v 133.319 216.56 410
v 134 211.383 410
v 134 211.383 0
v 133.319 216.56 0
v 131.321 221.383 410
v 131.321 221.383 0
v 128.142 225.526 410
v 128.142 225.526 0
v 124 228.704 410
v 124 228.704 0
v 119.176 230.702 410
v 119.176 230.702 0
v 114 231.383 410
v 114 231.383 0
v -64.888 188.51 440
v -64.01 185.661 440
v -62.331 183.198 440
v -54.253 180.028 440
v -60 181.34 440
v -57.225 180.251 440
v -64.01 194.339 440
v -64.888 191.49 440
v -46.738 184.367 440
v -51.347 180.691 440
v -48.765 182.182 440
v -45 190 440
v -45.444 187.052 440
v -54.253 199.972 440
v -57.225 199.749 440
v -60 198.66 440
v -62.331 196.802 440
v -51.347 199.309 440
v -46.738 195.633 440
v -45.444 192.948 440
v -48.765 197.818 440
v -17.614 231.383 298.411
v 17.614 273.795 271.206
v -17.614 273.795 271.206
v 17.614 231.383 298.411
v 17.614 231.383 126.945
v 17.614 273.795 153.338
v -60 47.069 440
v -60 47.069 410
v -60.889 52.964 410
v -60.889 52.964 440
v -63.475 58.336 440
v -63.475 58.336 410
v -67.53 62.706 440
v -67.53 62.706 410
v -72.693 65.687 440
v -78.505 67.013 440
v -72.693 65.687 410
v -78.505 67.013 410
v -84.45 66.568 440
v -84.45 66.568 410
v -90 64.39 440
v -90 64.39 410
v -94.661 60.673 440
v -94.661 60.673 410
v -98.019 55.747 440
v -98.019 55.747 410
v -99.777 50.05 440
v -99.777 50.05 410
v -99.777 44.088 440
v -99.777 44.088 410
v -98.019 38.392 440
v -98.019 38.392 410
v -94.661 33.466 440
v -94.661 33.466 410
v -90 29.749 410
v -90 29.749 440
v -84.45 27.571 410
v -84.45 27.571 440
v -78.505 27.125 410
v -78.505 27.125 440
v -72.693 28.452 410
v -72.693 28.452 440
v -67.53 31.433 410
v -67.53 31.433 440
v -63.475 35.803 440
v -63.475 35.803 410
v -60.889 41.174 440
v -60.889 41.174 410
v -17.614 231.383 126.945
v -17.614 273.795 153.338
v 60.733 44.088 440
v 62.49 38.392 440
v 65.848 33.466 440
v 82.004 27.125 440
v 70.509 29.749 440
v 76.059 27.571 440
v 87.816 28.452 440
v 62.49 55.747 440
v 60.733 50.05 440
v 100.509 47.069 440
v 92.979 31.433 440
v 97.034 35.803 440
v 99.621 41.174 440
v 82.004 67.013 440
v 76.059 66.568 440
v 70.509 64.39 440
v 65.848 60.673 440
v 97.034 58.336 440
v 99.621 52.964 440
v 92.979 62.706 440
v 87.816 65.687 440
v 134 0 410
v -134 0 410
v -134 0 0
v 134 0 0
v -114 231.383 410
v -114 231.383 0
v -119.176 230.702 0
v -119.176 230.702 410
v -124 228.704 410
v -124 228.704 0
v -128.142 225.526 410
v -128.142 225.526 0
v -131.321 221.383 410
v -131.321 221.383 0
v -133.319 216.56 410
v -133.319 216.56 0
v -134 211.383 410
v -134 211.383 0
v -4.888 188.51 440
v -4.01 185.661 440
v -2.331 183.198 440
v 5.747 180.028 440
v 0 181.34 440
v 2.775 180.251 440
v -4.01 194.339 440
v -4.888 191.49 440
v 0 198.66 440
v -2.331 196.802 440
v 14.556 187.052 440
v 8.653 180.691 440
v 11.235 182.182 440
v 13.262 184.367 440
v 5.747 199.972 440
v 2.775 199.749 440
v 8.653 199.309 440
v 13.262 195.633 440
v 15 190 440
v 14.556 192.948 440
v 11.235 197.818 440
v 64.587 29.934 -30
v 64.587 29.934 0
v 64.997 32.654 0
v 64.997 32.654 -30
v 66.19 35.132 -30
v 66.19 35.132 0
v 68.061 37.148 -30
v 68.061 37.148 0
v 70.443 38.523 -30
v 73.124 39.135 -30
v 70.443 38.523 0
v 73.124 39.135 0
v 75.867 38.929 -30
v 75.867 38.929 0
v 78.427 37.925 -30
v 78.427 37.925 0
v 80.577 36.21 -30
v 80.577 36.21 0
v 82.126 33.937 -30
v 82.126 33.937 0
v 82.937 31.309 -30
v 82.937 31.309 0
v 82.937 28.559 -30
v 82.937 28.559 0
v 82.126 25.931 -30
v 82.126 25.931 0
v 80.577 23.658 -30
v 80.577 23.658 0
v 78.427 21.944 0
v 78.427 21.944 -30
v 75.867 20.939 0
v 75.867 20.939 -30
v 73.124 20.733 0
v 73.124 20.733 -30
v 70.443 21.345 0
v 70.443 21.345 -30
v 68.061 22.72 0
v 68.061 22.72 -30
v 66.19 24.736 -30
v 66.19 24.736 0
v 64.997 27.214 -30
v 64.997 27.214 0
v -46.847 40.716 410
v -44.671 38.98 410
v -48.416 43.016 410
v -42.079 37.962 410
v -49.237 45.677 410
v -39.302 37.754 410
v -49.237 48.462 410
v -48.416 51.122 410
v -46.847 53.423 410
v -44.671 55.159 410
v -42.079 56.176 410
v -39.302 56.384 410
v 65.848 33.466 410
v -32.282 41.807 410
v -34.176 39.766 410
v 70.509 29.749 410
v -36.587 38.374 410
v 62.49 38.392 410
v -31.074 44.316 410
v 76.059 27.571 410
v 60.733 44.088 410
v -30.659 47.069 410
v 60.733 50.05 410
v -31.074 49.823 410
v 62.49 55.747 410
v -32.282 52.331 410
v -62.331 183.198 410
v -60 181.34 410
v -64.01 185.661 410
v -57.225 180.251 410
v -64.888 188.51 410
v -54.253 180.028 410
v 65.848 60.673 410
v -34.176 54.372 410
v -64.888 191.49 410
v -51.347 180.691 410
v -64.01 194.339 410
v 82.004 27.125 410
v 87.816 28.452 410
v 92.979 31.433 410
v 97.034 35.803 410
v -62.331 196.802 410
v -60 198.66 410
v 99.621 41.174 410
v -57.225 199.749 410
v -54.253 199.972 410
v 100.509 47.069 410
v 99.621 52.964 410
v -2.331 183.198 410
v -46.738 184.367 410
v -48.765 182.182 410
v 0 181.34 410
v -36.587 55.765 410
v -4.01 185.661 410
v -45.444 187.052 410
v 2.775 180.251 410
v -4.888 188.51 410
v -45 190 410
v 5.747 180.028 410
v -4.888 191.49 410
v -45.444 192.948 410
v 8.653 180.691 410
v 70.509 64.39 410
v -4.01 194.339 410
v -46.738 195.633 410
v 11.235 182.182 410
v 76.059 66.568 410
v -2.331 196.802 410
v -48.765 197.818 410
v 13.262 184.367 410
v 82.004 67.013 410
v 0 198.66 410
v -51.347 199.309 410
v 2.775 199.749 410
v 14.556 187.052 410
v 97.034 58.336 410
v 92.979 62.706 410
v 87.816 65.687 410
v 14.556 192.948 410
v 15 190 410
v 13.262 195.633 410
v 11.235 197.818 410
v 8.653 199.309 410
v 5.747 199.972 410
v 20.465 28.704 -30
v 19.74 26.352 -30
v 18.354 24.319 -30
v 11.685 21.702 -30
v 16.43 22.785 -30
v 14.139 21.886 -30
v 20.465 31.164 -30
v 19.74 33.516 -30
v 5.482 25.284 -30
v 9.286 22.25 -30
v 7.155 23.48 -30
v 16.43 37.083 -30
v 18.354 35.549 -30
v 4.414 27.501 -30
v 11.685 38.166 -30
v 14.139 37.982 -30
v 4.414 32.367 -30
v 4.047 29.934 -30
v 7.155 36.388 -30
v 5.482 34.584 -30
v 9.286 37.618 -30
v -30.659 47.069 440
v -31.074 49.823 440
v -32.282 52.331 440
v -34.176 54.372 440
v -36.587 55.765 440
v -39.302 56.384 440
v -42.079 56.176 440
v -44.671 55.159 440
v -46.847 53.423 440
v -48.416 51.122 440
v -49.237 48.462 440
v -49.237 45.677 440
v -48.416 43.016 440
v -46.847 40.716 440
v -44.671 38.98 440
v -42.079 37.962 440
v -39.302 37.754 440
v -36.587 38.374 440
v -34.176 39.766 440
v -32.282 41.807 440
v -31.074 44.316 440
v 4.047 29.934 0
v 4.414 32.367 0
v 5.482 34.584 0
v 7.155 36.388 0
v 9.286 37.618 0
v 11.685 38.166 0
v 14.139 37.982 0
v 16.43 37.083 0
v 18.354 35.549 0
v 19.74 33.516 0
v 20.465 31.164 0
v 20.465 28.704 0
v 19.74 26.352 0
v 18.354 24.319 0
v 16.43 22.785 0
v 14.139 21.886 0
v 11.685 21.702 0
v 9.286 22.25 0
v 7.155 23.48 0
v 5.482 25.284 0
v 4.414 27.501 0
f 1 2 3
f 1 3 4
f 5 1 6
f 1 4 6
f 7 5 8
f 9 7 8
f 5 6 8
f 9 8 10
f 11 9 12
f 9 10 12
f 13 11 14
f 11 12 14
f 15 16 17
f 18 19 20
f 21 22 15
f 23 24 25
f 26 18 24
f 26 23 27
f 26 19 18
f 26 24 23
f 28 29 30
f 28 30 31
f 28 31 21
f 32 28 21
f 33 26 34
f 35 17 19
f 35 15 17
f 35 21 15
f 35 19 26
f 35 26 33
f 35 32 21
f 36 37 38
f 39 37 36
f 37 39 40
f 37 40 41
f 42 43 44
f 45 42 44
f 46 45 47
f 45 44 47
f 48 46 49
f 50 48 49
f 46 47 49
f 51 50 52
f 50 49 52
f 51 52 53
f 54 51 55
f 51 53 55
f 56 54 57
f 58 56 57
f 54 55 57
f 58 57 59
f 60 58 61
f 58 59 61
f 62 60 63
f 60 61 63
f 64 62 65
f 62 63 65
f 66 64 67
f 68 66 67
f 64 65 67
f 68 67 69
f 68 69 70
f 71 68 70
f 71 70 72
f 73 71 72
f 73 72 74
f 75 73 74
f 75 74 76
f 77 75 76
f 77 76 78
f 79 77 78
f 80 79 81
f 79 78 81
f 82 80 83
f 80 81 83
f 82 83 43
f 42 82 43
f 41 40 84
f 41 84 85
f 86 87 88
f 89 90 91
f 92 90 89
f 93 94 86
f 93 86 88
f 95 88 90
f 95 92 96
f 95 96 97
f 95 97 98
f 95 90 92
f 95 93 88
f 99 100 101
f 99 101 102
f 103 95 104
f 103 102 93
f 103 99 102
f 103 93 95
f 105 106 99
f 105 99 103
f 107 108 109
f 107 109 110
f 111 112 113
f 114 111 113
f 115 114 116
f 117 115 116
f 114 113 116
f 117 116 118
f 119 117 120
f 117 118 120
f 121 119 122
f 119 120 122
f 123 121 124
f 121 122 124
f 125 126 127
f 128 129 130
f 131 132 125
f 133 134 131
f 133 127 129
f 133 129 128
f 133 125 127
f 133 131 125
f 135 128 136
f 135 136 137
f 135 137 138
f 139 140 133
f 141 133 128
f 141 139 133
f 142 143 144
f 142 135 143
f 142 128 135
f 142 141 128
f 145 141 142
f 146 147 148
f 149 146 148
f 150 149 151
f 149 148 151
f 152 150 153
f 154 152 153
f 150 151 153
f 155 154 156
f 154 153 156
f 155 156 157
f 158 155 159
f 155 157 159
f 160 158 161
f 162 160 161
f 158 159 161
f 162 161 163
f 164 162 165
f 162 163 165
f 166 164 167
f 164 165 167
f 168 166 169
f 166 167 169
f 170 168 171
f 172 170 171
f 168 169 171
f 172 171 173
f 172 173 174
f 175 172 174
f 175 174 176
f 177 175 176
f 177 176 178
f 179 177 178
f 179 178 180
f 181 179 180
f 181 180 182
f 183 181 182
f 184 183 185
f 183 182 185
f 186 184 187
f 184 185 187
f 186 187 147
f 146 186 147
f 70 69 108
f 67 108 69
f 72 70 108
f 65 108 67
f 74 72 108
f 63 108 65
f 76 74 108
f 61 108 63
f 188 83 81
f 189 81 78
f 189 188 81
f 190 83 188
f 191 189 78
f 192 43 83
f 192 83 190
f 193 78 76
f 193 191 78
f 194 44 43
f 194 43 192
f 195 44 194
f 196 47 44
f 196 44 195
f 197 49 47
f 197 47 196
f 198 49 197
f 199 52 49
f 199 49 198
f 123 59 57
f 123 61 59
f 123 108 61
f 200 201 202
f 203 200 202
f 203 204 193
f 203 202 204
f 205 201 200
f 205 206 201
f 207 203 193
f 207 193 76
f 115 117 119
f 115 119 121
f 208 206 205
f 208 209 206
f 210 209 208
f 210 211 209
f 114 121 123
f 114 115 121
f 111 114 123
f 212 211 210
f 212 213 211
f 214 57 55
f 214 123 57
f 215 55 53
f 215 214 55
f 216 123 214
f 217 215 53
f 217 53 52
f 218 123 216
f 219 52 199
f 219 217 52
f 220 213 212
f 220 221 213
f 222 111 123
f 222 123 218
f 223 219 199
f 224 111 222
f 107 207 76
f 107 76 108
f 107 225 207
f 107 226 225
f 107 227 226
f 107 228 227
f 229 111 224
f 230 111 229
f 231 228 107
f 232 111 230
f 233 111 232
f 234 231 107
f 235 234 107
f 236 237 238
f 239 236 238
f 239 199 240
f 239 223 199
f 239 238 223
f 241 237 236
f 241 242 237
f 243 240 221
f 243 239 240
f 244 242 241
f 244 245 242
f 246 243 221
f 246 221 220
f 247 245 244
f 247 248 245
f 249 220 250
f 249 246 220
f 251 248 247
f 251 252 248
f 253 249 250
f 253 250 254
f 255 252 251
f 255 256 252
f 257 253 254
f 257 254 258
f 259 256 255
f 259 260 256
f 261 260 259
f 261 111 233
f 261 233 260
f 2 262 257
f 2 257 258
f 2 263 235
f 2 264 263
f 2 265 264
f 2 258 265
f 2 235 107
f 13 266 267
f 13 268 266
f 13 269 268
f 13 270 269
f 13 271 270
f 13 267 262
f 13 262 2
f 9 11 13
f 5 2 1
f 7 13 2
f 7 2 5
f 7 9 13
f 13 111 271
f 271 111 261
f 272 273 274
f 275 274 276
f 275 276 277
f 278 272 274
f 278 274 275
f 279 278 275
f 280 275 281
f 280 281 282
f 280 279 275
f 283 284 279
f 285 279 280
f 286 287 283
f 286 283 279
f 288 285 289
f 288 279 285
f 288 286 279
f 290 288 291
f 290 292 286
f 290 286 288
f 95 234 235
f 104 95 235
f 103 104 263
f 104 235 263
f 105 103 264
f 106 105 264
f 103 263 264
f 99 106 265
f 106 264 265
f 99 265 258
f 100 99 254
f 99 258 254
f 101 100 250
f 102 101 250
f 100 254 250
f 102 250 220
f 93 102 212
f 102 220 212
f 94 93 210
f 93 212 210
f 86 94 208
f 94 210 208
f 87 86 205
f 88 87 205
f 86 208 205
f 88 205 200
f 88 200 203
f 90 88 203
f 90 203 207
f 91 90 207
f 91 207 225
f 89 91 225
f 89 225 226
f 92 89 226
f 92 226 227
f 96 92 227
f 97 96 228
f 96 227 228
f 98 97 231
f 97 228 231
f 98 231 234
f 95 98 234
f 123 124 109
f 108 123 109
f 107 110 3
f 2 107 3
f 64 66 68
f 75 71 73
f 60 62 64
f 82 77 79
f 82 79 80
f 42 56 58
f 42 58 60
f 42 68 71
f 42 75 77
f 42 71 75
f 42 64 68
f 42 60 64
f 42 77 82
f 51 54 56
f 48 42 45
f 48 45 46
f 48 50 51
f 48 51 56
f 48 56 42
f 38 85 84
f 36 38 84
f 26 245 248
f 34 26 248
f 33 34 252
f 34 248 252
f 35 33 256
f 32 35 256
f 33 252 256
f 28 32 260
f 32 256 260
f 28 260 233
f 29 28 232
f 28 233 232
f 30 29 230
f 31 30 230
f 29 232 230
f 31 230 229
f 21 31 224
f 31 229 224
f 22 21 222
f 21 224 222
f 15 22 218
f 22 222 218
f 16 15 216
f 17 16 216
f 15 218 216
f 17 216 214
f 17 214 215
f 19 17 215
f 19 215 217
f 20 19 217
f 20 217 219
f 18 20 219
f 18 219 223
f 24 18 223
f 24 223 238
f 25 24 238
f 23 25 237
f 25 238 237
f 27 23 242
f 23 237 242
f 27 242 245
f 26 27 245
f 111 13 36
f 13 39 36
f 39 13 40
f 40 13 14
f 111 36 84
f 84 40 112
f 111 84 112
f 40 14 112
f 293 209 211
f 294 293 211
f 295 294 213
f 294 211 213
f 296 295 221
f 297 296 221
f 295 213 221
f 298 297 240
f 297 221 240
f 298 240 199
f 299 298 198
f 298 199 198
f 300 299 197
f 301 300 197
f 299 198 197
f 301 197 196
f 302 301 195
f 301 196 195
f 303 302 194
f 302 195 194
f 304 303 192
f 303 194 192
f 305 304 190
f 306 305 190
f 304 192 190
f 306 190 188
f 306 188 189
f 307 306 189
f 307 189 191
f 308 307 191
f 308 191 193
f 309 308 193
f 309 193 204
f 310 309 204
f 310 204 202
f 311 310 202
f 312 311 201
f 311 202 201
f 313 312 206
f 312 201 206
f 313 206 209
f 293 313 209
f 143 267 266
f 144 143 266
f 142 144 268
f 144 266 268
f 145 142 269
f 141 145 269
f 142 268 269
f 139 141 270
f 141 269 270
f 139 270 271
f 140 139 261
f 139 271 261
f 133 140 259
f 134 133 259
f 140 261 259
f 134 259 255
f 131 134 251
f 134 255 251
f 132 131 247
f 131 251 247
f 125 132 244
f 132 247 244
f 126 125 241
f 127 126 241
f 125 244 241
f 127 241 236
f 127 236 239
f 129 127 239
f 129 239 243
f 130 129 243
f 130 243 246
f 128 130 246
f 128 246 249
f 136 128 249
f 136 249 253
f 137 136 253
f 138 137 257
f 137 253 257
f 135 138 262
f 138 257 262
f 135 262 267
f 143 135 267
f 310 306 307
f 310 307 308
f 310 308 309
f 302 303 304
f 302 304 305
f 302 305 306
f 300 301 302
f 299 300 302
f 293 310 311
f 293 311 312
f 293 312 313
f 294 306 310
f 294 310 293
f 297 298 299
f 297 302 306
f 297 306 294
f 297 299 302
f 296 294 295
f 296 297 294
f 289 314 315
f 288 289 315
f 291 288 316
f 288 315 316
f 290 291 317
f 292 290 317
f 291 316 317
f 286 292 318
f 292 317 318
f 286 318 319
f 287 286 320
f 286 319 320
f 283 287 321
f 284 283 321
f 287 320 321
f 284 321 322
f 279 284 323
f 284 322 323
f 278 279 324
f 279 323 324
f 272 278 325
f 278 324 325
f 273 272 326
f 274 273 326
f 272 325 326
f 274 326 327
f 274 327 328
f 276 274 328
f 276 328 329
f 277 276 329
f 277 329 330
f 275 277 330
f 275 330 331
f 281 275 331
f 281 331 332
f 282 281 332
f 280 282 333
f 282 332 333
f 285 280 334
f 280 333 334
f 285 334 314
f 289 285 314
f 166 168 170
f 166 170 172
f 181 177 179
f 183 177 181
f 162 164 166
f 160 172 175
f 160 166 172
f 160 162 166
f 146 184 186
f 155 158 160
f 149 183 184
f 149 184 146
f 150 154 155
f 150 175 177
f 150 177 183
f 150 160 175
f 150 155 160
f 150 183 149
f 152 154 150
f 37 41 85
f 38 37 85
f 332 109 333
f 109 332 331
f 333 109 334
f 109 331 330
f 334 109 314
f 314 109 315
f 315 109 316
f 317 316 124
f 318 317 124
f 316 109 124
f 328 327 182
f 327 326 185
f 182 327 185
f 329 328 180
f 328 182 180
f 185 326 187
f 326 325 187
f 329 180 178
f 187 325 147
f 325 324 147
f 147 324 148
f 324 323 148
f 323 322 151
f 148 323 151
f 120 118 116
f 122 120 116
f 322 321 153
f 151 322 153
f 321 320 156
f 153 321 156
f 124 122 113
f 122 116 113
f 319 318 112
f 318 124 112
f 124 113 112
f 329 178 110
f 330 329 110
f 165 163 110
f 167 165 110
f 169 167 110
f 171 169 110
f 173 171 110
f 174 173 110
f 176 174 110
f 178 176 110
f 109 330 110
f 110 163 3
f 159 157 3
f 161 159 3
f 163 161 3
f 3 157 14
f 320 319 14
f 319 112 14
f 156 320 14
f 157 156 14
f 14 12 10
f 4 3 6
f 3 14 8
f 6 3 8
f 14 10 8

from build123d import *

# Parameters (mm, degrees)
EXTRUDE_1_DEPTH     = 410
CUT_EXTRUDE_1_DEPTH = 165
SKETCH_4_R          = 20
SKETCH_4_R_2        = 9.341042427
SKETCH_4_R_3        = 10
EXTRUDE_2_DEPTH     = 30
SKETCH_5_R          = 8.254931616
SKETCH_5_R_2        = 9.226679221
EXTRUDE_3_DEPTH     = 30


with BuildPart() as part:
    # Эскиз2 → Бобышка-Вытянуть1 (new body)
    with BuildSketch(Plane.XY):
        with BuildLine():
            Line((-134, 0), (134, 0))
            Line((134, 0), (134, 211.383370155))
            ThreePointArc((134, 211.383370155), (128.142135624, 225.525505779), (114, 231.383370155))
            Line((114, 231.383370155), (17.613812431, 231.383370155))
            Line((17.613812431, 231.383370155), (17.613812431, 273.795473599))
            Line((17.613812431, 273.795473599), (-17.613812431, 273.795473599))
            Line((-17.613812431, 273.795473599), (-17.613812431, 231.383370155))
            Line((-17.613812431, 231.383370155), (-114, 231.383370155))
            ThreePointArc((-114, 231.383370155), (-128.142135624, 225.525505779), (-134, 211.383370155))
            Line((-134, 211.383370155), (-134, 0))
        make_face()
    extrude(amount=EXTRUDE_1_DEPTH)

    # Эскиз3 → Вырез-Вытянуть1 (cut, symmetric)
    with BuildSketch(Plane(origin=(0, 0, 0), x_dir=(0, 0, -1), z_dir=(1, 0, 0))):
        Polygon((-271.206372328, 273.795473599), (-298.41124171, 231.383370155), (-410.493924083, 231.383370155), (-410.493924083, 334.856445818), (0, 334.856445818), (0, 231.383370155), (-126.94500188, 231.383370155), (-153.338385259, 273.795473599), align=None)
    extrude(amount=CUT_EXTRUDE_1_DEPTH, both=True, mode=Mode.SUBTRACT)

    # Эскиз4 → Бобышка-Вытянуть2 (add)
    with BuildSketch(Plane.XY.offset(410)):
        with Locations((-80, 47.069313646)):
            Circle(SKETCH_4_R)
        with Locations((-40, 47.069313646)):
            Circle(SKETCH_4_R_2)
        with Locations((80.509329497, 47.069313646)):
            Circle(SKETCH_4_R)
        with Locations((-55, 190)):
            Circle(SKETCH_4_R_3)
        with Locations((5, 190)):
            Circle(SKETCH_4_R_3)
    extrude(amount=EXTRUDE_2_DEPTH)

    # Эскиз5 → Бобышка-Вытянуть3 (add)
    with BuildSketch(Plane(origin=(0, 0, 0), x_dir=(-1, 0, 0), z_dir=(0, 0, -1))):
        with Locations((-12.302238961, 29.934052236)):
            Circle(SKETCH_5_R)
        with Locations((-73.813433765, 29.934052236)):
            Circle(SKETCH_5_R_2)
    extrude(amount=EXTRUDE_3_DEPTH)


solid = part.part
